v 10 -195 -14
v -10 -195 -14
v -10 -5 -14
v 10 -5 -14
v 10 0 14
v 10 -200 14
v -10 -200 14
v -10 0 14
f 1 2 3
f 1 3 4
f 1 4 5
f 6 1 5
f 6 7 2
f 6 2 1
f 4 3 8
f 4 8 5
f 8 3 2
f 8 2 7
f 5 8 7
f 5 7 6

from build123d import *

# Parameters (mm, degrees)
F0_W     = 20
F0_H     = 28
F1_DEPTH = 200
F2_SIZE2 = 27.99999
F2_SIZE  = 4.99999
F3_SIZE2 = 4.99999
F3_SIZE  = 27.99999


# Not quite as in the source:
# - a fillet or chamfer is up to 0.001 mm smaller than in the source, because OpenCascade refuses the exact size


with BuildPart() as f1:
    # F0 (on Front) → F1 (new body)
    with BuildSketch(Plane.XZ):
        Rectangle(F0_W, F0_H)
    extrude(amount=F1_DEPTH)

    # F2 (size 5 and 28 in the source; OpenCascade refuses exactly that, so slightly less here)
    f2_edges = [f1.edges().sort_by_distance(p)[0] for p in [
        (0, -200, -14),
    ]]
    f2_side = f1.faces().sort_by_distance((0, -100, -14))[0]
    chamfer(f2_edges, length=F2_SIZE, length2=F2_SIZE2, reference=f2_side)

    # F3 (size 28 and 5 in the source; OpenCascade refuses exactly that, so slightly less here)
    f3_edges = [f1.edges().sort_by_distance(p)[0] for p in [
        (0, 0, -14),
    ]]
    f3_side = f1.faces().sort_by_distance((0, 0, 0))[0]
    chamfer(f3_edges, length=F3_SIZE, length2=F3_SIZE2, reference=f3_side)


solid = f1.part
